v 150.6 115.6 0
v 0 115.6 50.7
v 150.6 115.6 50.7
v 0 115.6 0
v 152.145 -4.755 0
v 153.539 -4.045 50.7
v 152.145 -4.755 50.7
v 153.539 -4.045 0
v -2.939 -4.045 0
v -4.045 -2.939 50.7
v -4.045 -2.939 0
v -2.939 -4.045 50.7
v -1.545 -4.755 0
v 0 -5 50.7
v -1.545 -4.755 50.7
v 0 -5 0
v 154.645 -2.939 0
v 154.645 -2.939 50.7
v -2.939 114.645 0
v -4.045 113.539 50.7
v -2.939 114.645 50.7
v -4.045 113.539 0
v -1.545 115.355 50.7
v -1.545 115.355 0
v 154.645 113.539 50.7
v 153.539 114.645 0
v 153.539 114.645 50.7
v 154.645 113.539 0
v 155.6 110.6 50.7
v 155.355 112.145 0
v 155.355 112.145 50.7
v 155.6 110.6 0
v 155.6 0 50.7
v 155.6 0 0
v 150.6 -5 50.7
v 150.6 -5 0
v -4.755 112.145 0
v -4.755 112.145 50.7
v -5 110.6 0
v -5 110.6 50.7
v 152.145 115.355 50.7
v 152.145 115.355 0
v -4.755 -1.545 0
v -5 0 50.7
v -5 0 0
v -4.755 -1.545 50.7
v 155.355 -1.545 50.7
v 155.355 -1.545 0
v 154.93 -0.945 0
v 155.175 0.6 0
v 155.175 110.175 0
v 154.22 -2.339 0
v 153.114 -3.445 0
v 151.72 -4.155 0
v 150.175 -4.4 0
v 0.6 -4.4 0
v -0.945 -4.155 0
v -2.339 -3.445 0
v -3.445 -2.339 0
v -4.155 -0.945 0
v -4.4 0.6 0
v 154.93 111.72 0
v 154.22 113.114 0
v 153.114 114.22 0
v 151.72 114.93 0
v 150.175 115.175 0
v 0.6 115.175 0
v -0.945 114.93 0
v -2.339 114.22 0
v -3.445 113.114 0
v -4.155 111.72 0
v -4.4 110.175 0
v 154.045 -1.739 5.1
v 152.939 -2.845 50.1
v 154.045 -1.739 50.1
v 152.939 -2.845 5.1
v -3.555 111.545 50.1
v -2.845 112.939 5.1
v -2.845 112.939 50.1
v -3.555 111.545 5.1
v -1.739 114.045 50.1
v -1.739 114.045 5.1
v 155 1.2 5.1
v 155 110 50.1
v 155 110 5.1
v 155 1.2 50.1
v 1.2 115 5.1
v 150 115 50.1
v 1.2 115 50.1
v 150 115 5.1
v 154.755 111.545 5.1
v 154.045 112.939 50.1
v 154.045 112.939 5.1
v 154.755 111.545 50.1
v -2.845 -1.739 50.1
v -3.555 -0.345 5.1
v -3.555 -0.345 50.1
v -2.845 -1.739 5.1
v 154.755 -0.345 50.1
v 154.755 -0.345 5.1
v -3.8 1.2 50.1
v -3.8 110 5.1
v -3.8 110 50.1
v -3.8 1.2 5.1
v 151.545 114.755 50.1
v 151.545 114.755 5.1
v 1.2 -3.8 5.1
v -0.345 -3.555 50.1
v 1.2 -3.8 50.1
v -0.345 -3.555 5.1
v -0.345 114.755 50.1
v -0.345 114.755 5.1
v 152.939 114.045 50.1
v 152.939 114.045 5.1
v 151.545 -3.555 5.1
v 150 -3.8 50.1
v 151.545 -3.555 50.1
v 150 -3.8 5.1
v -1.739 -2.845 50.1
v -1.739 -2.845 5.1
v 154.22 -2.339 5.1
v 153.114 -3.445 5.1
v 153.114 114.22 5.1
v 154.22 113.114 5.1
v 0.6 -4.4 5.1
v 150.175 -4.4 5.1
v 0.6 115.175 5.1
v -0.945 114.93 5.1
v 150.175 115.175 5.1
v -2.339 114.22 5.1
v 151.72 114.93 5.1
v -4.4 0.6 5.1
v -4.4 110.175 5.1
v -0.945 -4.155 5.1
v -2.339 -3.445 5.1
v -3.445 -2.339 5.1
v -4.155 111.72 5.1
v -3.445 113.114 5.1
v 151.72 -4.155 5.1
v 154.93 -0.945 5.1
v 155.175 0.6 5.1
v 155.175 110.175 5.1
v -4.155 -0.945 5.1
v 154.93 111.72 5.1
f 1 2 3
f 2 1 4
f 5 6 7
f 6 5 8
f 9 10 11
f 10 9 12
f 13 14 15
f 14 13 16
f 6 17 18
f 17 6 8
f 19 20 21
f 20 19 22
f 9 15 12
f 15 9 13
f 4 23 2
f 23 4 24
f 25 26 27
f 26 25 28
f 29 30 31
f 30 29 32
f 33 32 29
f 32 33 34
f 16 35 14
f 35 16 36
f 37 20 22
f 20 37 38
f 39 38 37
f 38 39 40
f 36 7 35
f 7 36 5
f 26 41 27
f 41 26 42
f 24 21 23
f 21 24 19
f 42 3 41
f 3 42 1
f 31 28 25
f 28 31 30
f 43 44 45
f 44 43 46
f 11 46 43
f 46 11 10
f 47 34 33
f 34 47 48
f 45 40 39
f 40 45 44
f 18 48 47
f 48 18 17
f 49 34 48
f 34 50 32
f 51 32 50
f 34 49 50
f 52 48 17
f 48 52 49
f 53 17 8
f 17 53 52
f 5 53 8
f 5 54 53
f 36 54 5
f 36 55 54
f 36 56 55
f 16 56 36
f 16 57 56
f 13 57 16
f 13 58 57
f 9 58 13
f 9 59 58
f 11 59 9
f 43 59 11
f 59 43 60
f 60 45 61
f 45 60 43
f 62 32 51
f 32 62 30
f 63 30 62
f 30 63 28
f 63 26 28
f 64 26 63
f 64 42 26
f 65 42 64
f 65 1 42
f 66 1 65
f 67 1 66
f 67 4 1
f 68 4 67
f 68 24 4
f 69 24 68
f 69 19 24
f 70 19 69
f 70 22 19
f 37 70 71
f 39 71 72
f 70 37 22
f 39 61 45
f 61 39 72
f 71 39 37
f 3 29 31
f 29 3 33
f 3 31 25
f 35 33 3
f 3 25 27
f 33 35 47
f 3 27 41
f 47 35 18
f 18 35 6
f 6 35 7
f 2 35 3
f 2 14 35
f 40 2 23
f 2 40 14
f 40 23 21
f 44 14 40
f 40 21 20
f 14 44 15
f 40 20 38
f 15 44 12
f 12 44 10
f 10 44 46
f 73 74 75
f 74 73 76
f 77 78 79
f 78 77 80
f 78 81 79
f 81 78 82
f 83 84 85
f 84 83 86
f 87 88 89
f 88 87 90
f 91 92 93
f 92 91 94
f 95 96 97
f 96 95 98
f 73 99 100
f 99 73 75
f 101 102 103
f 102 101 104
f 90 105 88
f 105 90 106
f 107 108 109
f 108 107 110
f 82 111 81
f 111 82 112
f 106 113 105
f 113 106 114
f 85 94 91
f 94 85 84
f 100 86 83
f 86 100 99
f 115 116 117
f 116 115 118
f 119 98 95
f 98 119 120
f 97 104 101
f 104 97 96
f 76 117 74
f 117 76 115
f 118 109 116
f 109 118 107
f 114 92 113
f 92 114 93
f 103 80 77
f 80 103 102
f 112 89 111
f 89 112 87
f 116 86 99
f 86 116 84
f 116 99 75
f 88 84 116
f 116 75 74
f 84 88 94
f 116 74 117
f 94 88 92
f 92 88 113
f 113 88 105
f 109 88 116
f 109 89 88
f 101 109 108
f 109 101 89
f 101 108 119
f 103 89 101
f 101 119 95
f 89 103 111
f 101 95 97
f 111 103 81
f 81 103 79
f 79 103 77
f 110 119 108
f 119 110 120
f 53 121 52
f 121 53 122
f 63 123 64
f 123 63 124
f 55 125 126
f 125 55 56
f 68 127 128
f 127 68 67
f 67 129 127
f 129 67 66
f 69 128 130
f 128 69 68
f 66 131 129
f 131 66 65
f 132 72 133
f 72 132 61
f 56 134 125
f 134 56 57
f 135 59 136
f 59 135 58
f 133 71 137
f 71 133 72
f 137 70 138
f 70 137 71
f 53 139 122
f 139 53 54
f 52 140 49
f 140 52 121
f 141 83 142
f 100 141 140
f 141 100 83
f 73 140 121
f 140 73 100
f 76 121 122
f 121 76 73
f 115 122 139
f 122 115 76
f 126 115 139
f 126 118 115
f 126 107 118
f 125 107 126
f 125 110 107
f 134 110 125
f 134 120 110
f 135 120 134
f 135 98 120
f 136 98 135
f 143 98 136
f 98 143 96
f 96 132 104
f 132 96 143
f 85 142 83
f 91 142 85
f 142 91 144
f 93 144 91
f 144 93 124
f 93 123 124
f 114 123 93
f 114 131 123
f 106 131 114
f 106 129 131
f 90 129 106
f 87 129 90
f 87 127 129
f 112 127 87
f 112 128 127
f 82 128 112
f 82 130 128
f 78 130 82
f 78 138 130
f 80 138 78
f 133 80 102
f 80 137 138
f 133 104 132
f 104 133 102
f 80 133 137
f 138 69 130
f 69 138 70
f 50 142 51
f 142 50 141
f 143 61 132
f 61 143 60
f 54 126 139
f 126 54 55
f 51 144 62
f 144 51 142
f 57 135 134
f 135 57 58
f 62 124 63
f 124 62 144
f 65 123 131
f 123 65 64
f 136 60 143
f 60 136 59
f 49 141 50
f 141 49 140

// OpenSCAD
height = 50;
mount_hole = 3.5;
clear = 0.175;
thickness = 1.2;

$fn=20;

module leg () {
    difference () {
        cylinder(r=MLAB_grid/2 + 0.3,h=legs_height);
        cylinder(r=MLAB_grid/2 - 0.3,h=legs_height);
    }
}

difference () {
    minkowski() {
	    cube([150+thickness/2,110+thickness/2,height+thickness/2]);          // base plastics brick
        cylinder(r=5,h=0.1);
    }
    translate ([thickness, thickness, 0])
        minkowski() {
                cube([150-thickness, 110-thickness, height]);          // hollow
            cylinder(r=5,h=0.1);
        }

    translate ([thickness/2, thickness/2, 0])
        difference () {
            minkowski() {
                    cube([150-thickness/2+clear, 110-thickness/2+clear, 5]);          // hollow for BASE1115
                cylinder(r=5,h=0.1);
            }
            /// TODO Fixing cilinders teeths
        }
}
